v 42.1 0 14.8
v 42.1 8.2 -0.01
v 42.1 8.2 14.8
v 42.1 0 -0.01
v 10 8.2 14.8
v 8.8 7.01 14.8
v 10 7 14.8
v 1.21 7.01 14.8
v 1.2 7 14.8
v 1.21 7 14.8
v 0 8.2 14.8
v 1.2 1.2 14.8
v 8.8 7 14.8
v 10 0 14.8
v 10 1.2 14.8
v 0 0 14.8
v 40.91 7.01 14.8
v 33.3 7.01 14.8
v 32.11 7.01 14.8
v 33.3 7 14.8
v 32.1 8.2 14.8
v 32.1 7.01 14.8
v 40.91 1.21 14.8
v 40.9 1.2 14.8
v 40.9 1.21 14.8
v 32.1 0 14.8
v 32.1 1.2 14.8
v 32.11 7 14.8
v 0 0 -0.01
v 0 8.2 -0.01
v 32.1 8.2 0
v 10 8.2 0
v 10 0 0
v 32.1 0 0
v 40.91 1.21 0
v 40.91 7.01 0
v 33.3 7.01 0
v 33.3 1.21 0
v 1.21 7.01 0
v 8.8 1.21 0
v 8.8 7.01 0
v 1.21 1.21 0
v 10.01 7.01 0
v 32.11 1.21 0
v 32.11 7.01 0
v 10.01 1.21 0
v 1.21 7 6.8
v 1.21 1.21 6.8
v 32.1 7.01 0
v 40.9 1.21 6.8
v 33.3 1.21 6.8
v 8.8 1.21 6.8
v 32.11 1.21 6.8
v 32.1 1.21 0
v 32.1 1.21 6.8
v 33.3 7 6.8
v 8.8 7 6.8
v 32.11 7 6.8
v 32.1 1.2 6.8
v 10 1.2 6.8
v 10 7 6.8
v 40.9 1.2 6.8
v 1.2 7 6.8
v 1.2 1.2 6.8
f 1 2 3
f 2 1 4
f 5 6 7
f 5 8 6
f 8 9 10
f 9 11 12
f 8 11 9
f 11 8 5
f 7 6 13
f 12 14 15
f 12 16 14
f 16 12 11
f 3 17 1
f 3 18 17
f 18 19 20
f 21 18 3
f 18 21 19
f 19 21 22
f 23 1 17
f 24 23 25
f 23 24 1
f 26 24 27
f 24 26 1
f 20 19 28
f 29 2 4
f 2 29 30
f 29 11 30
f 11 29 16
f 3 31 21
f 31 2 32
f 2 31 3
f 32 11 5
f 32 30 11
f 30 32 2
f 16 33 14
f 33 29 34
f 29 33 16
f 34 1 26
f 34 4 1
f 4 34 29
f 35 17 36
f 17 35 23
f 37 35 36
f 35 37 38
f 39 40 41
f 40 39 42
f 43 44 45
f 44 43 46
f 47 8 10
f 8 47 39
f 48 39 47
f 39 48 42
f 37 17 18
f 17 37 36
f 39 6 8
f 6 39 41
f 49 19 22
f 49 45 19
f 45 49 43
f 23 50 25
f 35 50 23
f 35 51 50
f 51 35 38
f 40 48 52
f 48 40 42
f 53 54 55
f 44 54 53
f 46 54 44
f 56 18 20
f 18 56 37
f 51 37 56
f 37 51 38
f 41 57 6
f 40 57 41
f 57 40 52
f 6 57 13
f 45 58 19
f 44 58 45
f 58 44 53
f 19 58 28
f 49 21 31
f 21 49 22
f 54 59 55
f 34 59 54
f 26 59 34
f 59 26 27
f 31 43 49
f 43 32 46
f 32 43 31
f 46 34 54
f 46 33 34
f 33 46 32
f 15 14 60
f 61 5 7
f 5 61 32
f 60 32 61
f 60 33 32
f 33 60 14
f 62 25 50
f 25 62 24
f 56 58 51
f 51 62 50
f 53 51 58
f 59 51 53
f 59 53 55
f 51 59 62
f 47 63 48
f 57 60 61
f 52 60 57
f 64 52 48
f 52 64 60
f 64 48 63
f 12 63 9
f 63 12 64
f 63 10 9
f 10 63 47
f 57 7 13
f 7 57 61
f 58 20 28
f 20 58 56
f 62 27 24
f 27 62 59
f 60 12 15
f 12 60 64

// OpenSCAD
// file: ../Base/Boxes.scad
// Fischertechnik Box Foundation
// Pre-designed Boxes

use <Constants.scad>

include <PlacementOptions.scad>

box190Width = 190;
box190Depth = 130;
box130Width = 130;
box130Depth = 95;

// Values are from an original ec3 box
topBottomDifference = 1.5;
outerHeight = 40;
baseThickness = 1.8;
innerHeight = outerHeight - baseThickness;
stackExcess = 5.7;
radius = 3.5;
wallThickness = 1.5;
tolerance = 0.2;

boxWallThickness = wallThickness;
boxBaseThickness = baseThickness;
boxWebWidth = 3.0;

// getBoxWallThickness()
// Gets the wall thickness of a Fischertechnik Box
function getBoxWallThickness() = boxWallThickness;

// getBoxUsageHeight(height = 38.2)
// Gets the usable height of a Fischertechnik box
// height = Outer height of the box from the bottom to the upper edge.
function getBoxUsageHeight(height = outerHeight) = height - baseThickness - stackExcess;

// getBoxInnerHeight()
// Gets the inner height of a Fischertechnik box, including the stack excess
function getBoxInnerHeight() = innerHeight;

// getBoxBaseThickness()
// Gets the thickness of the Fischertechnik box base.
function getBoxBaseThickness() = boxBaseThickness;

// getBoxWebWidth()
// Gets the width of a box web
function getBoxWebWidth() = boxWebWidth;

// getBox190Space()
// Gets the usable inner space of a Box 190 as an x/y-list
function getBox190Space() = [
    box190Width - 2*getBoxWallThickness() - topBottomDifference, 
    box190Depth - 2*getBoxWallThickness() - topBottomDifference ];

// RoundedCornerPlate(width, depth, height, radius)
// Creates a body plate with rounded corners for a box. Used
// also to create the complete box with the hull module.
// width = Width of the plate
// depth = depth of the plate 
// height = thickness of the plate
// radius = radius of the rounded corner
module RoundedCornerPlate(width, depth, height, radius) {
    translate([radius, radius])
    hull() {
        w = width-2*radius;
        d = depth-2*radius;
        cube([w, d, height]);
        cylinder(height, r=radius, $fn=getFragments());
        translate([w, 0])
            cylinder(height, r=radius, $fn=getFragments());
        translate([w, d])
            cylinder(height, r=radius, $fn=getFragments());
        translate([0, d])
            cylinder(height, r=radius, $fn=getFragments());
    }
}

// BoxBase(width, depth)
// Creates an empty stackable Fischertechnik compatible box
// width = Outer width of the box (190, 130, ...)
// depth = Outer depth of the box (130, 95, ...)

module BoxBase(width, depth, height=outerHeight) {    
    thinPlate = 0.01;

    innerHeight = height - baseThickness;    
    
    module Body(tolerance=tolerance) {
        hull() {
            // Bottom with tolerance to fit into the original boxes when stacked
            translate([-wallThickness+tolerance, -wallThickness+tolerance, -baseThickness])
                RoundedCornerPlate(width-topBottomDifference-2*tolerance, depth-topBottomDifference-2*tolerance, thinPlate, radius);
            
            // Top
            translate([-wallThickness-topBottomDifference/2, -wallThickness-topBottomDifference/2, innerHeight-thinPlate])
                RoundedCornerPlate(width, depth, thinPlate, radius);
         }
    }

    module Cutoff() {
        hull() {
            coWidth = width - 2*wallThickness;
            coDepth = depth - 2*wallThickness;
            
            // Bottom
            RoundedCornerPlate(coWidth-topBottomDifference, coDepth-topBottomDifference, thinPlate, radius);

            // Top
            translate([-topBottomDifference/2, -topBottomDifference/2, innerHeight+thinPlate]) 
                RoundedCornerPlate(coWidth, coDepth, thinPlate, radius);
        }
    }
    
    difference() {        
        Body();
        Cutoff();
        stackOffset = innerHeight - stackExcess;
        translate([0, 0, stackOffset + baseThickness])
            Body(tolerance=0);
    }
}

// Creates the Fischertechnik empty box 130x190 mm and places it at position 0,0
// 190x130 are the outer sizes, the inner space is slightly smaller. Use getBox190Space() to get the inner sizes.
// The box is positioned that the usable inner space is at the 0,0,0 position.

module Box190() {
    BoxBase(box190Width, box190Depth);
}

// Gets the usable inner space of a Box 130 as an x/y-list
function getBox130Space() = [
    box130Width - 2*getBoxWallThickness() - topBottomDifference, 
    box130Depth - 2*getBoxWallThickness() - topBottomDifference ];

// Creates the Fischertechnik empty box 95x130 mm and places it at position 0,0
// 190x130 are the outer sizes, the inner space is slightly smaller. Use getBox190Space() to get the inner sizes.
// The box is positioned that the usable inner space is at the 0,0,0 position.

module Box130() {
    BoxBase(box130Width, box130Depth);
}

// Creates a web at the specified box walls
// corner 0 = LowerLeft, 1 = UpperLeft, 2 = UpperRight, 3 = LowerRight
// side 0 = LeftOfCorner, 1 = RightOfCorner
// distance = Distance in mm from the corner
// boxSpace = inner width and depth of the box (default: Box 190)
// webWidth = length of the web (default is 3 mms)
// webThickness = thickness of the web (default is 1 mm)
// height = Height of the web (standard is getBoxUsageHeight())

module BoxWeb(corner, side, distance, boxSpace=getBox190Space(), webWidth=getBoxWebWidth(), webThickness=1.0, height=getBoxUsageHeight()) {
    sink = getBoxWallThickness()/2;

    width = (corner % 2 == 0) ? 
            (side == LeftOfCorner ? webWidth : webThickness) :
            (side == LeftOfCorner ? webThickness : webWidth);

    depth = (corner % 2 == 0) ? 
            (side == RightOfCorner ? webWidth : webThickness) :
            (side == RightOfCorner ? webThickness : webWidth);
    
    xDiff = corner == LowerLeft ? 
                (side == LeftOfCorner ? -sink : distance) :
            (corner == UpperLeft ?                
                (side == LeftOfCorner ? distance : -sink) :
            (corner == UpperRight ?
                (side == LeftOfCorner ? boxSpace.x-webWidth+sink : boxSpace.x-distance-webThickness) :
                (side == LeftOfCorner ? boxSpace.x-distance-webThickness: boxSpace.x-webWidth+sink)));

    yDiff = corner == LowerLeft ? 
                (side == RightOfCorner ? -sink : distance) :
            (corner == UpperLeft ?
                (side == RightOfCorner ? boxSpace.y-distance-webThickness : boxSpace.y-webWidth+sink) :
            (corner == UpperRight ?
                (side == RightOfCorner ? boxSpace.y-webWidth+sink : boxSpace.y-distance-webThickness) :
                (side == RightOfCorner ? distance : -sink)));
    
    translate([xDiff, yDiff, -getExcess()])
        cube([width, depth, height + 2*getExcess()]);
}
// file: ../Base/Rotation.scad
// Fischertechnik Box Foundation
// Geometry Helpers Rotation

include <PlacementOptions.scad>

// getRotatedSpace(space, rotation=NoRotation)
// Rotates the space dependent on the specified rotation

function getRotatedSpace(space, rotation=NoRotation) = [
    (rotation == Rotate90 || rotation == Rotate270) ? space.y : space.x,
    (rotation == Rotate90 || rotation == Rotate270) ? space.x : space.y
];

// Rotates the given space around the fixed left lower corner
// space = the space the children needs as width/depth list [width,depth]
// rotation = 0 Rotate0 degrees, 1 Rotate90 degrees, 2 Rotate180 degrees, 3 Rotate270 degrees (equivalent to -90)

module RotateFix(space, rotation=NoRotation) {
    dy = (rotation == Rotate0 || rotation == Rotate270) ? 0 :
        (rotation == Rotate90) ? space.x :
        space.y;
    dx = (rotation < Rotate180) ? 0 :
        (rotation == Rotate180) ? space.x :
        space.y;
    
    translate([dx, dy, 0])
        rotate([0, 0, rotations[rotation]])
            children();
}
// file: ../Base/Alignment.scad
// Fischertechnik Box Foundation
// Geometry Helpers Alignment

include <PlacementOptions.scad>

// getAlignedX(elementWidth, spaceWidth, align=AlignRight, offset=0)
// Gets the aligned X offset of an element with the given
// width in the given space.
// elementWidth = The width of the element to positon
// spaceWidth = The space where the element should be aligned
// align = 0 AlignLeft, 1 AlignCenter, 2 AlignRight
// offset = an optional offset from the aligned position. When
// aligned left or centered, then positive values are in X direction.
// When aligned right then positive values are in negative X direction.

function getAlignedX(elementWidth, spaceWidth, align=AlignRight, offset=0) =
    (align == AlignLeft) ?
        offset :
        ((align == AlignCenter) ?
        (spaceWidth - elementWidth)/2 + offset :
        spaceWidth - offset - elementWidth);

// getAlignedY(elementDepth, spaceDepth, align=AlignTop, offset=0)
// Gets the aligned Y offset of an element with the given
// depth in the given space.
// elementDepth = The depth of the element to positon
// spaceDepth = The space where the element should be aligned
// align = 0 AlignBottom, 1 AlignCenter, 2 AlignTop
// offset = an optional offset from the aligned position. When
// aligned bottom or centered, then positive values are in Y direction.
// When aligned top then positive values are in negative Y direction.

function getAlignedY(elementDepth, spaceDepth, align=AlignTop, offset=0) =
    (align == AlignBottom) ?
        offset :
        ((align == AlignCenter) ?
        (spaceDepth - elementDepth)/2 + offset :
        spaceDepth - offset - elementDepth);
// file: ../Base/PlacementOptions.scad
// Fischertechnik Box Foundation
// Placement Options

// Alignment
NoAlign = 0;
AlignLeft = 1;
AlignBottom = 2;
AlignCenter = 3;
AlignRight = 4;
AlignTop = 5;

// Element rotation degree steps
rotations = [0, -90, -180, -270];

// Rotation
NoRotation = 0;
Rotate0 = 0;
Rotate90 = 1;
Rotate180 = 2;
Rotate270 = 3;

// Docking (seen from above)
NoDock = -1;
DockLeft = 0;
DockTop = 1;
DockRight = 2;
DockCorner = 2;
DockBottom = 3;

// Web corners
LowerLeft = 0;
UpperLeft = 1;
UpperRight = 2;
LowerRight = 3;

// Web position relative to corner
LeftOfCorner = 0;
RightOfCorner = 1;
// file: ../Base/Placement.scad
// Fischertechnik Box Foundation
// Geometry Helpers Placement

use <Constants.scad>
use <Alignment.scad>
use <Rotation.scad>
use <Boxes.scad>

include <PlacementOptions.scad>

// Place(x=0, y=0, elementSpace=[0,0], alignX=AlignLeft, alignY=AlignBottom, rotation=Rotate0, boxSpace=getBox190Space())
// Places the child at the specified position
// y = Y-Position. This is a relative position when an X aligment is specified.
// x = X-Position. This is a relative position when an Y aligment is specified.
// elementSpace = space of the element to be placed [x,y]
// alignX = -1=NoAlign, 0 AlignLeft, 1 AlignCenter, 3 AlignRight (elementSpace and boxSpace required!)
// alignY = -1=NoAlign, 2 AlignBottom, 1 AlignCenter, 4 AlignTop (elementSpace and boxSpace required!)
// rotation = 0 Rotate0 0 degrees, 1 Rotate90 90 degrees, 
// 2 Rotate180 180 degrees, 3 Rotate270 270 degrees (equivalent to -90)
// boxSpace = Inner space of the box where the placement occurs [x,y] - default is Box 190x130 inner space

module Place(x=0, y=0, elementSpace=[0,0], 
  alignX=AlignLeft, alignY=AlignBottom, 
  rotation=NoRotation, boxSpace=getBox190Space()) {

    module Position(x, y, space, rotation=Rotate0) {
        translate([x, y, 0])
            RotateFix(space, rotation)
                children();
    }

    space = getRotatedSpace(elementSpace, rotation);
    alignedX = getAlignedX(space.x, boxSpace.x, alignX, x);
    alignedY = getAlignedY(space.y, boxSpace.y, alignY, y);
    Position(alignedX, alignedY, elementSpace, rotation)
        children();
}

// Center(space=getBox130Space(), elementSpace=[0,0])
// space = Space where the children is centered. For cylinder use centered=true and no elementSpace.
// elementSpace = space of the element to be centered [x,y]

module Center(space=getBox190Space(), elementSpace=[0,0]) {
    Place(elementSpace=elementSpace, boxSpace=space, alignX=AlignCenter, alignY=AlignCenter)
        children();
}

// CenterHorizontal(width=0, y=0, offset=0, space=getBox130Space())
// width = Width of the element to be placed.
// y = Y position of the element
// offset = Offset from the center position (negative will be left of the center)
// space = Space where the element is placed

module CenterHorizontal(width=0, y=0, offset=0, space=getBox190Space()) {
    Place(x=offset, y=y, elementSpace=[width, 0], boxSpace=space, alignX=AlignCenter)
        children(0);
}

// CenterVertical(depth=0, x=0, offset=0, space=getBox130Space())
// depth = Depth of the element to be placed.
// x = X position of the element
// offset = Offset from the center position (negative will be down of the center)
// space = Space where the element is placed

module CenterVertical(depth=0, x=0, offset=0, space=getBox190Space()) {
    Place(x=x, y=offset, elementSpace=[0, depth], boxSpace=space, alignY=AlignCenter)
        children(0);
}

// getIsVertical(align)
// True if the specified alignment needs a vertical orientation for a divider (AlignRight, AlignLeft)

function getIsVertical(align) = (align == AlignRight || align == AlignLeft);

// getIsHorizontal(align)
// True if the specified alignment needs a horizontal orientation for a divider (AlignTop, AlignBottom)

function getIsHorizontal(align) = (align == AlignTop || align == AlignBottom);
// file: ../Base/Constants.scad
// Fischertechnik Box Foundation
// Constants

// Constant values necessary for multiple elements

// Base constants
dividerThickness = 1.2;
excess = 0.01;
fragments = 90;
tolerance = 0.8;

// Gets the thickness of a divider 
function getDividerThickness() = dividerThickness;

// Gets the excess that is used to merge walls into each other
function getExcess() = excess;

// Gets amount of fragments of a cylinder
function getFragments() = fragments;

// Gets the inner tolerance of a frame to each side
function getTolerance() = tolerance;


// Fischertechnik specific constants
axisDiameter = 4;
axisBottomDiameter = axisDiameter + 1;
axisTolerance = 0.2;

// Gets axis diameter of Fischertechnik axis
function getAxisDiameter() = axisDiameter;

// Gets axis diameter tolerance (subtracted for element axis)
function getAxisTolerance() = axisTolerance;

// Gets the axis diameter for standing axis
function getStandAxisDiameter() = getAxisDiameter() - getAxisTolerance();

// Gets axis bottom diameter for thicker part at the bottom
function getAxisBottomDiameter() = axisBottomDiameter;

standardEdgeDistance = 2.5;
standardWebDistance = 11.5;
standardCornerLength = 15;

// gets the standard distance to the wall of the box for dockable frames with webs
function getStandardEdgeDistance() = standardEdgeDistance;

// gets the standard distance of each web to the corner of the dockable frame
function getStandardWebDistance() = standardWebDistance;

// gets the standard length of the corner walls of a dockable frame
function getStandardCornerLength() = standardCornerLength;

tubeWallFactor = 0.8;

// gets the wall thickness of a tube.
function getTubeWallThickness() = tubeWallFactor * getDividerThickness();

smallPartsFrameHeight = 20;

// gets the frame height for docked small parts boxes.
function getSmallPartsFrameHeight() = smallPartsFrameHeight;

hubRingDiameter = 19.5;
hubRingLevelDiameter = 21;

// gets the diameter of a tube matching the inner ring of a wheel
function getHubRingDiameter() = hubRingDiameter;

// gets the diameter of a hub tube with a thicker diameter
function getHubRingLevelDiameter() = hubRingLevelDiameter;
// main file
// Fischertechnik Box Library
// Frame for two Strut 30
// 31764, 36309, 36912, 38537, 38538, 160545

use <../ModelBase/Complex.scad>

width = 38.9;
depth = 5.8;
height = 14.8;

// getFrameTwoStrut30Space()
// Gets the space needed for the frame for two struts.
function getFrameTwoStrut30Space() = getElevatedFramesWithCutoffSpace([width, depth, height]);

// FrameTwoConnectors45()
// Frame for two struts 30

module FrameTwoStrut30() {    
    bearingLength = 8.8;
    loadHeight = 8.0;
    
    ElevatedFramesWithCutoff([width, depth, loadHeight], depth, height, bearingLength);
}

// Test
color("lightgray")
FrameTwoStrut30();
